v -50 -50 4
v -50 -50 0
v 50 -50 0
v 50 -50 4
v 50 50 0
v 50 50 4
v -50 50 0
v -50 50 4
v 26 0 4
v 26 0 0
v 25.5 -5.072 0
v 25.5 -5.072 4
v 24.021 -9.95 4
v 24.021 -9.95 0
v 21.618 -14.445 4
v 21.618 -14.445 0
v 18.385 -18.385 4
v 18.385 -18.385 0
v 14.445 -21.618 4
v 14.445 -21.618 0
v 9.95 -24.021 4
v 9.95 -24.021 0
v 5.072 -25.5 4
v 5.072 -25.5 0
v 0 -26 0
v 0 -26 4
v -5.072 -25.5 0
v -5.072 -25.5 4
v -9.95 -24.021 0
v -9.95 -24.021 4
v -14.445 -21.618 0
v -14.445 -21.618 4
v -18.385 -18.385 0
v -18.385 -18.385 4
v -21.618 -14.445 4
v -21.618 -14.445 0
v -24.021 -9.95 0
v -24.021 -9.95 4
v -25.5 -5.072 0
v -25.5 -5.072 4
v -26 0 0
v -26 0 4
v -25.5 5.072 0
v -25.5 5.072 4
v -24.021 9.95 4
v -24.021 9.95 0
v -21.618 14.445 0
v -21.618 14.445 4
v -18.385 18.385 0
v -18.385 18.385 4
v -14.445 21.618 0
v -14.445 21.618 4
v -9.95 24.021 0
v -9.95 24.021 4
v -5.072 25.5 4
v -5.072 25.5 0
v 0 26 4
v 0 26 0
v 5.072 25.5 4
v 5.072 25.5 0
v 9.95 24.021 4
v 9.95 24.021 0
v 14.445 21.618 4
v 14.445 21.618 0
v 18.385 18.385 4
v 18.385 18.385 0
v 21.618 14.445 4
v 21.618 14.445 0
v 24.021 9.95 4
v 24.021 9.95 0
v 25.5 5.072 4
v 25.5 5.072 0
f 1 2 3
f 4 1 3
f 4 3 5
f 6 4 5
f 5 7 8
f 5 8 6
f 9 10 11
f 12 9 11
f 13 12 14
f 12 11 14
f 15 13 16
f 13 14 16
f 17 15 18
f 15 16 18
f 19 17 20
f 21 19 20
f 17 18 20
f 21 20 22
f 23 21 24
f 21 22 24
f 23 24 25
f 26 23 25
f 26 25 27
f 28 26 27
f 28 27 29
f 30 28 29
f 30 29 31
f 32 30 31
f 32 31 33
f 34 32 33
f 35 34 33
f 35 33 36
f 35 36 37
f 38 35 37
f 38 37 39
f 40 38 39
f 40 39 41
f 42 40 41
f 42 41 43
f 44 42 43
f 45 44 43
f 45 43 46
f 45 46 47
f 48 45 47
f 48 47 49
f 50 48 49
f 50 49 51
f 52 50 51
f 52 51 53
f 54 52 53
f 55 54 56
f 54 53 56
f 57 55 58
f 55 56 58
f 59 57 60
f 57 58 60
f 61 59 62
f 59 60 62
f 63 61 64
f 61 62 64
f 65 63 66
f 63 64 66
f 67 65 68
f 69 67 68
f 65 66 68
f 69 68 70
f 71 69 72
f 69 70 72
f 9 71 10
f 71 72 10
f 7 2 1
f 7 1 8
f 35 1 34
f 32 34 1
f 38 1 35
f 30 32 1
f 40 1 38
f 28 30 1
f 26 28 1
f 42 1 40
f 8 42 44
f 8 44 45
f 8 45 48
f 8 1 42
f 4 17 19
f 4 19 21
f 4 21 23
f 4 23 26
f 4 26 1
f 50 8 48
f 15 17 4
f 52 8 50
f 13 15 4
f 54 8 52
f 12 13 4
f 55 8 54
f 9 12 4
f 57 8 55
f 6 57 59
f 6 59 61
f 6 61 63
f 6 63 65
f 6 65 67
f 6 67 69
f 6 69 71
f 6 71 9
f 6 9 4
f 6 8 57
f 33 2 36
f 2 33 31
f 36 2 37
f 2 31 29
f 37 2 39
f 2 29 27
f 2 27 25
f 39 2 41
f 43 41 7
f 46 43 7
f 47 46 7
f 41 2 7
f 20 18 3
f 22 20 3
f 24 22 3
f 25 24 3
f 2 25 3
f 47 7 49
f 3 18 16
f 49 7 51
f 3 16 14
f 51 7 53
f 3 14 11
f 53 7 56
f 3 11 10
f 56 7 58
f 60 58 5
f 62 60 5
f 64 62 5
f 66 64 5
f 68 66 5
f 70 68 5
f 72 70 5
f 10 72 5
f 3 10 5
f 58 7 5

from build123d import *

# Parameters (mm, degrees)
SKETCH001_R   = 26
EXTRUDE_DEPTH = 10
BOX_W         = 100
BOX_H         = 100
BOX_DEPTH     = 4


with BuildPart() as glass_holder_hole:
    # Sketch001 (on Face5 of Box) → Extrude (new body)
    with BuildSketch(Plane(origin=(-50, -50, 0), x_dir=(1, 0, 0), z_dir=(0, 0, -1))):
        with Locations((50, -50)):
            Circle(SKETCH001_R)
    extrude(amount=-EXTRUDE_DEPTH)


with BuildPart() as glass_holder:
    # Box → Box (new body)
    with BuildSketch(Plane(origin=(-50, -50, 0), x_dir=(1, 0, 0), z_dir=(0, 0, 1))):
        with Locations((50, 50)):
            Rectangle(BOX_W, BOX_H)
    extrude(amount=BOX_DEPTH)

    # Cut: cut Glass Holder Hole
    add(glass_holder_hole.part, mode=Mode.SUBTRACT)


solid = glass_holder.part
